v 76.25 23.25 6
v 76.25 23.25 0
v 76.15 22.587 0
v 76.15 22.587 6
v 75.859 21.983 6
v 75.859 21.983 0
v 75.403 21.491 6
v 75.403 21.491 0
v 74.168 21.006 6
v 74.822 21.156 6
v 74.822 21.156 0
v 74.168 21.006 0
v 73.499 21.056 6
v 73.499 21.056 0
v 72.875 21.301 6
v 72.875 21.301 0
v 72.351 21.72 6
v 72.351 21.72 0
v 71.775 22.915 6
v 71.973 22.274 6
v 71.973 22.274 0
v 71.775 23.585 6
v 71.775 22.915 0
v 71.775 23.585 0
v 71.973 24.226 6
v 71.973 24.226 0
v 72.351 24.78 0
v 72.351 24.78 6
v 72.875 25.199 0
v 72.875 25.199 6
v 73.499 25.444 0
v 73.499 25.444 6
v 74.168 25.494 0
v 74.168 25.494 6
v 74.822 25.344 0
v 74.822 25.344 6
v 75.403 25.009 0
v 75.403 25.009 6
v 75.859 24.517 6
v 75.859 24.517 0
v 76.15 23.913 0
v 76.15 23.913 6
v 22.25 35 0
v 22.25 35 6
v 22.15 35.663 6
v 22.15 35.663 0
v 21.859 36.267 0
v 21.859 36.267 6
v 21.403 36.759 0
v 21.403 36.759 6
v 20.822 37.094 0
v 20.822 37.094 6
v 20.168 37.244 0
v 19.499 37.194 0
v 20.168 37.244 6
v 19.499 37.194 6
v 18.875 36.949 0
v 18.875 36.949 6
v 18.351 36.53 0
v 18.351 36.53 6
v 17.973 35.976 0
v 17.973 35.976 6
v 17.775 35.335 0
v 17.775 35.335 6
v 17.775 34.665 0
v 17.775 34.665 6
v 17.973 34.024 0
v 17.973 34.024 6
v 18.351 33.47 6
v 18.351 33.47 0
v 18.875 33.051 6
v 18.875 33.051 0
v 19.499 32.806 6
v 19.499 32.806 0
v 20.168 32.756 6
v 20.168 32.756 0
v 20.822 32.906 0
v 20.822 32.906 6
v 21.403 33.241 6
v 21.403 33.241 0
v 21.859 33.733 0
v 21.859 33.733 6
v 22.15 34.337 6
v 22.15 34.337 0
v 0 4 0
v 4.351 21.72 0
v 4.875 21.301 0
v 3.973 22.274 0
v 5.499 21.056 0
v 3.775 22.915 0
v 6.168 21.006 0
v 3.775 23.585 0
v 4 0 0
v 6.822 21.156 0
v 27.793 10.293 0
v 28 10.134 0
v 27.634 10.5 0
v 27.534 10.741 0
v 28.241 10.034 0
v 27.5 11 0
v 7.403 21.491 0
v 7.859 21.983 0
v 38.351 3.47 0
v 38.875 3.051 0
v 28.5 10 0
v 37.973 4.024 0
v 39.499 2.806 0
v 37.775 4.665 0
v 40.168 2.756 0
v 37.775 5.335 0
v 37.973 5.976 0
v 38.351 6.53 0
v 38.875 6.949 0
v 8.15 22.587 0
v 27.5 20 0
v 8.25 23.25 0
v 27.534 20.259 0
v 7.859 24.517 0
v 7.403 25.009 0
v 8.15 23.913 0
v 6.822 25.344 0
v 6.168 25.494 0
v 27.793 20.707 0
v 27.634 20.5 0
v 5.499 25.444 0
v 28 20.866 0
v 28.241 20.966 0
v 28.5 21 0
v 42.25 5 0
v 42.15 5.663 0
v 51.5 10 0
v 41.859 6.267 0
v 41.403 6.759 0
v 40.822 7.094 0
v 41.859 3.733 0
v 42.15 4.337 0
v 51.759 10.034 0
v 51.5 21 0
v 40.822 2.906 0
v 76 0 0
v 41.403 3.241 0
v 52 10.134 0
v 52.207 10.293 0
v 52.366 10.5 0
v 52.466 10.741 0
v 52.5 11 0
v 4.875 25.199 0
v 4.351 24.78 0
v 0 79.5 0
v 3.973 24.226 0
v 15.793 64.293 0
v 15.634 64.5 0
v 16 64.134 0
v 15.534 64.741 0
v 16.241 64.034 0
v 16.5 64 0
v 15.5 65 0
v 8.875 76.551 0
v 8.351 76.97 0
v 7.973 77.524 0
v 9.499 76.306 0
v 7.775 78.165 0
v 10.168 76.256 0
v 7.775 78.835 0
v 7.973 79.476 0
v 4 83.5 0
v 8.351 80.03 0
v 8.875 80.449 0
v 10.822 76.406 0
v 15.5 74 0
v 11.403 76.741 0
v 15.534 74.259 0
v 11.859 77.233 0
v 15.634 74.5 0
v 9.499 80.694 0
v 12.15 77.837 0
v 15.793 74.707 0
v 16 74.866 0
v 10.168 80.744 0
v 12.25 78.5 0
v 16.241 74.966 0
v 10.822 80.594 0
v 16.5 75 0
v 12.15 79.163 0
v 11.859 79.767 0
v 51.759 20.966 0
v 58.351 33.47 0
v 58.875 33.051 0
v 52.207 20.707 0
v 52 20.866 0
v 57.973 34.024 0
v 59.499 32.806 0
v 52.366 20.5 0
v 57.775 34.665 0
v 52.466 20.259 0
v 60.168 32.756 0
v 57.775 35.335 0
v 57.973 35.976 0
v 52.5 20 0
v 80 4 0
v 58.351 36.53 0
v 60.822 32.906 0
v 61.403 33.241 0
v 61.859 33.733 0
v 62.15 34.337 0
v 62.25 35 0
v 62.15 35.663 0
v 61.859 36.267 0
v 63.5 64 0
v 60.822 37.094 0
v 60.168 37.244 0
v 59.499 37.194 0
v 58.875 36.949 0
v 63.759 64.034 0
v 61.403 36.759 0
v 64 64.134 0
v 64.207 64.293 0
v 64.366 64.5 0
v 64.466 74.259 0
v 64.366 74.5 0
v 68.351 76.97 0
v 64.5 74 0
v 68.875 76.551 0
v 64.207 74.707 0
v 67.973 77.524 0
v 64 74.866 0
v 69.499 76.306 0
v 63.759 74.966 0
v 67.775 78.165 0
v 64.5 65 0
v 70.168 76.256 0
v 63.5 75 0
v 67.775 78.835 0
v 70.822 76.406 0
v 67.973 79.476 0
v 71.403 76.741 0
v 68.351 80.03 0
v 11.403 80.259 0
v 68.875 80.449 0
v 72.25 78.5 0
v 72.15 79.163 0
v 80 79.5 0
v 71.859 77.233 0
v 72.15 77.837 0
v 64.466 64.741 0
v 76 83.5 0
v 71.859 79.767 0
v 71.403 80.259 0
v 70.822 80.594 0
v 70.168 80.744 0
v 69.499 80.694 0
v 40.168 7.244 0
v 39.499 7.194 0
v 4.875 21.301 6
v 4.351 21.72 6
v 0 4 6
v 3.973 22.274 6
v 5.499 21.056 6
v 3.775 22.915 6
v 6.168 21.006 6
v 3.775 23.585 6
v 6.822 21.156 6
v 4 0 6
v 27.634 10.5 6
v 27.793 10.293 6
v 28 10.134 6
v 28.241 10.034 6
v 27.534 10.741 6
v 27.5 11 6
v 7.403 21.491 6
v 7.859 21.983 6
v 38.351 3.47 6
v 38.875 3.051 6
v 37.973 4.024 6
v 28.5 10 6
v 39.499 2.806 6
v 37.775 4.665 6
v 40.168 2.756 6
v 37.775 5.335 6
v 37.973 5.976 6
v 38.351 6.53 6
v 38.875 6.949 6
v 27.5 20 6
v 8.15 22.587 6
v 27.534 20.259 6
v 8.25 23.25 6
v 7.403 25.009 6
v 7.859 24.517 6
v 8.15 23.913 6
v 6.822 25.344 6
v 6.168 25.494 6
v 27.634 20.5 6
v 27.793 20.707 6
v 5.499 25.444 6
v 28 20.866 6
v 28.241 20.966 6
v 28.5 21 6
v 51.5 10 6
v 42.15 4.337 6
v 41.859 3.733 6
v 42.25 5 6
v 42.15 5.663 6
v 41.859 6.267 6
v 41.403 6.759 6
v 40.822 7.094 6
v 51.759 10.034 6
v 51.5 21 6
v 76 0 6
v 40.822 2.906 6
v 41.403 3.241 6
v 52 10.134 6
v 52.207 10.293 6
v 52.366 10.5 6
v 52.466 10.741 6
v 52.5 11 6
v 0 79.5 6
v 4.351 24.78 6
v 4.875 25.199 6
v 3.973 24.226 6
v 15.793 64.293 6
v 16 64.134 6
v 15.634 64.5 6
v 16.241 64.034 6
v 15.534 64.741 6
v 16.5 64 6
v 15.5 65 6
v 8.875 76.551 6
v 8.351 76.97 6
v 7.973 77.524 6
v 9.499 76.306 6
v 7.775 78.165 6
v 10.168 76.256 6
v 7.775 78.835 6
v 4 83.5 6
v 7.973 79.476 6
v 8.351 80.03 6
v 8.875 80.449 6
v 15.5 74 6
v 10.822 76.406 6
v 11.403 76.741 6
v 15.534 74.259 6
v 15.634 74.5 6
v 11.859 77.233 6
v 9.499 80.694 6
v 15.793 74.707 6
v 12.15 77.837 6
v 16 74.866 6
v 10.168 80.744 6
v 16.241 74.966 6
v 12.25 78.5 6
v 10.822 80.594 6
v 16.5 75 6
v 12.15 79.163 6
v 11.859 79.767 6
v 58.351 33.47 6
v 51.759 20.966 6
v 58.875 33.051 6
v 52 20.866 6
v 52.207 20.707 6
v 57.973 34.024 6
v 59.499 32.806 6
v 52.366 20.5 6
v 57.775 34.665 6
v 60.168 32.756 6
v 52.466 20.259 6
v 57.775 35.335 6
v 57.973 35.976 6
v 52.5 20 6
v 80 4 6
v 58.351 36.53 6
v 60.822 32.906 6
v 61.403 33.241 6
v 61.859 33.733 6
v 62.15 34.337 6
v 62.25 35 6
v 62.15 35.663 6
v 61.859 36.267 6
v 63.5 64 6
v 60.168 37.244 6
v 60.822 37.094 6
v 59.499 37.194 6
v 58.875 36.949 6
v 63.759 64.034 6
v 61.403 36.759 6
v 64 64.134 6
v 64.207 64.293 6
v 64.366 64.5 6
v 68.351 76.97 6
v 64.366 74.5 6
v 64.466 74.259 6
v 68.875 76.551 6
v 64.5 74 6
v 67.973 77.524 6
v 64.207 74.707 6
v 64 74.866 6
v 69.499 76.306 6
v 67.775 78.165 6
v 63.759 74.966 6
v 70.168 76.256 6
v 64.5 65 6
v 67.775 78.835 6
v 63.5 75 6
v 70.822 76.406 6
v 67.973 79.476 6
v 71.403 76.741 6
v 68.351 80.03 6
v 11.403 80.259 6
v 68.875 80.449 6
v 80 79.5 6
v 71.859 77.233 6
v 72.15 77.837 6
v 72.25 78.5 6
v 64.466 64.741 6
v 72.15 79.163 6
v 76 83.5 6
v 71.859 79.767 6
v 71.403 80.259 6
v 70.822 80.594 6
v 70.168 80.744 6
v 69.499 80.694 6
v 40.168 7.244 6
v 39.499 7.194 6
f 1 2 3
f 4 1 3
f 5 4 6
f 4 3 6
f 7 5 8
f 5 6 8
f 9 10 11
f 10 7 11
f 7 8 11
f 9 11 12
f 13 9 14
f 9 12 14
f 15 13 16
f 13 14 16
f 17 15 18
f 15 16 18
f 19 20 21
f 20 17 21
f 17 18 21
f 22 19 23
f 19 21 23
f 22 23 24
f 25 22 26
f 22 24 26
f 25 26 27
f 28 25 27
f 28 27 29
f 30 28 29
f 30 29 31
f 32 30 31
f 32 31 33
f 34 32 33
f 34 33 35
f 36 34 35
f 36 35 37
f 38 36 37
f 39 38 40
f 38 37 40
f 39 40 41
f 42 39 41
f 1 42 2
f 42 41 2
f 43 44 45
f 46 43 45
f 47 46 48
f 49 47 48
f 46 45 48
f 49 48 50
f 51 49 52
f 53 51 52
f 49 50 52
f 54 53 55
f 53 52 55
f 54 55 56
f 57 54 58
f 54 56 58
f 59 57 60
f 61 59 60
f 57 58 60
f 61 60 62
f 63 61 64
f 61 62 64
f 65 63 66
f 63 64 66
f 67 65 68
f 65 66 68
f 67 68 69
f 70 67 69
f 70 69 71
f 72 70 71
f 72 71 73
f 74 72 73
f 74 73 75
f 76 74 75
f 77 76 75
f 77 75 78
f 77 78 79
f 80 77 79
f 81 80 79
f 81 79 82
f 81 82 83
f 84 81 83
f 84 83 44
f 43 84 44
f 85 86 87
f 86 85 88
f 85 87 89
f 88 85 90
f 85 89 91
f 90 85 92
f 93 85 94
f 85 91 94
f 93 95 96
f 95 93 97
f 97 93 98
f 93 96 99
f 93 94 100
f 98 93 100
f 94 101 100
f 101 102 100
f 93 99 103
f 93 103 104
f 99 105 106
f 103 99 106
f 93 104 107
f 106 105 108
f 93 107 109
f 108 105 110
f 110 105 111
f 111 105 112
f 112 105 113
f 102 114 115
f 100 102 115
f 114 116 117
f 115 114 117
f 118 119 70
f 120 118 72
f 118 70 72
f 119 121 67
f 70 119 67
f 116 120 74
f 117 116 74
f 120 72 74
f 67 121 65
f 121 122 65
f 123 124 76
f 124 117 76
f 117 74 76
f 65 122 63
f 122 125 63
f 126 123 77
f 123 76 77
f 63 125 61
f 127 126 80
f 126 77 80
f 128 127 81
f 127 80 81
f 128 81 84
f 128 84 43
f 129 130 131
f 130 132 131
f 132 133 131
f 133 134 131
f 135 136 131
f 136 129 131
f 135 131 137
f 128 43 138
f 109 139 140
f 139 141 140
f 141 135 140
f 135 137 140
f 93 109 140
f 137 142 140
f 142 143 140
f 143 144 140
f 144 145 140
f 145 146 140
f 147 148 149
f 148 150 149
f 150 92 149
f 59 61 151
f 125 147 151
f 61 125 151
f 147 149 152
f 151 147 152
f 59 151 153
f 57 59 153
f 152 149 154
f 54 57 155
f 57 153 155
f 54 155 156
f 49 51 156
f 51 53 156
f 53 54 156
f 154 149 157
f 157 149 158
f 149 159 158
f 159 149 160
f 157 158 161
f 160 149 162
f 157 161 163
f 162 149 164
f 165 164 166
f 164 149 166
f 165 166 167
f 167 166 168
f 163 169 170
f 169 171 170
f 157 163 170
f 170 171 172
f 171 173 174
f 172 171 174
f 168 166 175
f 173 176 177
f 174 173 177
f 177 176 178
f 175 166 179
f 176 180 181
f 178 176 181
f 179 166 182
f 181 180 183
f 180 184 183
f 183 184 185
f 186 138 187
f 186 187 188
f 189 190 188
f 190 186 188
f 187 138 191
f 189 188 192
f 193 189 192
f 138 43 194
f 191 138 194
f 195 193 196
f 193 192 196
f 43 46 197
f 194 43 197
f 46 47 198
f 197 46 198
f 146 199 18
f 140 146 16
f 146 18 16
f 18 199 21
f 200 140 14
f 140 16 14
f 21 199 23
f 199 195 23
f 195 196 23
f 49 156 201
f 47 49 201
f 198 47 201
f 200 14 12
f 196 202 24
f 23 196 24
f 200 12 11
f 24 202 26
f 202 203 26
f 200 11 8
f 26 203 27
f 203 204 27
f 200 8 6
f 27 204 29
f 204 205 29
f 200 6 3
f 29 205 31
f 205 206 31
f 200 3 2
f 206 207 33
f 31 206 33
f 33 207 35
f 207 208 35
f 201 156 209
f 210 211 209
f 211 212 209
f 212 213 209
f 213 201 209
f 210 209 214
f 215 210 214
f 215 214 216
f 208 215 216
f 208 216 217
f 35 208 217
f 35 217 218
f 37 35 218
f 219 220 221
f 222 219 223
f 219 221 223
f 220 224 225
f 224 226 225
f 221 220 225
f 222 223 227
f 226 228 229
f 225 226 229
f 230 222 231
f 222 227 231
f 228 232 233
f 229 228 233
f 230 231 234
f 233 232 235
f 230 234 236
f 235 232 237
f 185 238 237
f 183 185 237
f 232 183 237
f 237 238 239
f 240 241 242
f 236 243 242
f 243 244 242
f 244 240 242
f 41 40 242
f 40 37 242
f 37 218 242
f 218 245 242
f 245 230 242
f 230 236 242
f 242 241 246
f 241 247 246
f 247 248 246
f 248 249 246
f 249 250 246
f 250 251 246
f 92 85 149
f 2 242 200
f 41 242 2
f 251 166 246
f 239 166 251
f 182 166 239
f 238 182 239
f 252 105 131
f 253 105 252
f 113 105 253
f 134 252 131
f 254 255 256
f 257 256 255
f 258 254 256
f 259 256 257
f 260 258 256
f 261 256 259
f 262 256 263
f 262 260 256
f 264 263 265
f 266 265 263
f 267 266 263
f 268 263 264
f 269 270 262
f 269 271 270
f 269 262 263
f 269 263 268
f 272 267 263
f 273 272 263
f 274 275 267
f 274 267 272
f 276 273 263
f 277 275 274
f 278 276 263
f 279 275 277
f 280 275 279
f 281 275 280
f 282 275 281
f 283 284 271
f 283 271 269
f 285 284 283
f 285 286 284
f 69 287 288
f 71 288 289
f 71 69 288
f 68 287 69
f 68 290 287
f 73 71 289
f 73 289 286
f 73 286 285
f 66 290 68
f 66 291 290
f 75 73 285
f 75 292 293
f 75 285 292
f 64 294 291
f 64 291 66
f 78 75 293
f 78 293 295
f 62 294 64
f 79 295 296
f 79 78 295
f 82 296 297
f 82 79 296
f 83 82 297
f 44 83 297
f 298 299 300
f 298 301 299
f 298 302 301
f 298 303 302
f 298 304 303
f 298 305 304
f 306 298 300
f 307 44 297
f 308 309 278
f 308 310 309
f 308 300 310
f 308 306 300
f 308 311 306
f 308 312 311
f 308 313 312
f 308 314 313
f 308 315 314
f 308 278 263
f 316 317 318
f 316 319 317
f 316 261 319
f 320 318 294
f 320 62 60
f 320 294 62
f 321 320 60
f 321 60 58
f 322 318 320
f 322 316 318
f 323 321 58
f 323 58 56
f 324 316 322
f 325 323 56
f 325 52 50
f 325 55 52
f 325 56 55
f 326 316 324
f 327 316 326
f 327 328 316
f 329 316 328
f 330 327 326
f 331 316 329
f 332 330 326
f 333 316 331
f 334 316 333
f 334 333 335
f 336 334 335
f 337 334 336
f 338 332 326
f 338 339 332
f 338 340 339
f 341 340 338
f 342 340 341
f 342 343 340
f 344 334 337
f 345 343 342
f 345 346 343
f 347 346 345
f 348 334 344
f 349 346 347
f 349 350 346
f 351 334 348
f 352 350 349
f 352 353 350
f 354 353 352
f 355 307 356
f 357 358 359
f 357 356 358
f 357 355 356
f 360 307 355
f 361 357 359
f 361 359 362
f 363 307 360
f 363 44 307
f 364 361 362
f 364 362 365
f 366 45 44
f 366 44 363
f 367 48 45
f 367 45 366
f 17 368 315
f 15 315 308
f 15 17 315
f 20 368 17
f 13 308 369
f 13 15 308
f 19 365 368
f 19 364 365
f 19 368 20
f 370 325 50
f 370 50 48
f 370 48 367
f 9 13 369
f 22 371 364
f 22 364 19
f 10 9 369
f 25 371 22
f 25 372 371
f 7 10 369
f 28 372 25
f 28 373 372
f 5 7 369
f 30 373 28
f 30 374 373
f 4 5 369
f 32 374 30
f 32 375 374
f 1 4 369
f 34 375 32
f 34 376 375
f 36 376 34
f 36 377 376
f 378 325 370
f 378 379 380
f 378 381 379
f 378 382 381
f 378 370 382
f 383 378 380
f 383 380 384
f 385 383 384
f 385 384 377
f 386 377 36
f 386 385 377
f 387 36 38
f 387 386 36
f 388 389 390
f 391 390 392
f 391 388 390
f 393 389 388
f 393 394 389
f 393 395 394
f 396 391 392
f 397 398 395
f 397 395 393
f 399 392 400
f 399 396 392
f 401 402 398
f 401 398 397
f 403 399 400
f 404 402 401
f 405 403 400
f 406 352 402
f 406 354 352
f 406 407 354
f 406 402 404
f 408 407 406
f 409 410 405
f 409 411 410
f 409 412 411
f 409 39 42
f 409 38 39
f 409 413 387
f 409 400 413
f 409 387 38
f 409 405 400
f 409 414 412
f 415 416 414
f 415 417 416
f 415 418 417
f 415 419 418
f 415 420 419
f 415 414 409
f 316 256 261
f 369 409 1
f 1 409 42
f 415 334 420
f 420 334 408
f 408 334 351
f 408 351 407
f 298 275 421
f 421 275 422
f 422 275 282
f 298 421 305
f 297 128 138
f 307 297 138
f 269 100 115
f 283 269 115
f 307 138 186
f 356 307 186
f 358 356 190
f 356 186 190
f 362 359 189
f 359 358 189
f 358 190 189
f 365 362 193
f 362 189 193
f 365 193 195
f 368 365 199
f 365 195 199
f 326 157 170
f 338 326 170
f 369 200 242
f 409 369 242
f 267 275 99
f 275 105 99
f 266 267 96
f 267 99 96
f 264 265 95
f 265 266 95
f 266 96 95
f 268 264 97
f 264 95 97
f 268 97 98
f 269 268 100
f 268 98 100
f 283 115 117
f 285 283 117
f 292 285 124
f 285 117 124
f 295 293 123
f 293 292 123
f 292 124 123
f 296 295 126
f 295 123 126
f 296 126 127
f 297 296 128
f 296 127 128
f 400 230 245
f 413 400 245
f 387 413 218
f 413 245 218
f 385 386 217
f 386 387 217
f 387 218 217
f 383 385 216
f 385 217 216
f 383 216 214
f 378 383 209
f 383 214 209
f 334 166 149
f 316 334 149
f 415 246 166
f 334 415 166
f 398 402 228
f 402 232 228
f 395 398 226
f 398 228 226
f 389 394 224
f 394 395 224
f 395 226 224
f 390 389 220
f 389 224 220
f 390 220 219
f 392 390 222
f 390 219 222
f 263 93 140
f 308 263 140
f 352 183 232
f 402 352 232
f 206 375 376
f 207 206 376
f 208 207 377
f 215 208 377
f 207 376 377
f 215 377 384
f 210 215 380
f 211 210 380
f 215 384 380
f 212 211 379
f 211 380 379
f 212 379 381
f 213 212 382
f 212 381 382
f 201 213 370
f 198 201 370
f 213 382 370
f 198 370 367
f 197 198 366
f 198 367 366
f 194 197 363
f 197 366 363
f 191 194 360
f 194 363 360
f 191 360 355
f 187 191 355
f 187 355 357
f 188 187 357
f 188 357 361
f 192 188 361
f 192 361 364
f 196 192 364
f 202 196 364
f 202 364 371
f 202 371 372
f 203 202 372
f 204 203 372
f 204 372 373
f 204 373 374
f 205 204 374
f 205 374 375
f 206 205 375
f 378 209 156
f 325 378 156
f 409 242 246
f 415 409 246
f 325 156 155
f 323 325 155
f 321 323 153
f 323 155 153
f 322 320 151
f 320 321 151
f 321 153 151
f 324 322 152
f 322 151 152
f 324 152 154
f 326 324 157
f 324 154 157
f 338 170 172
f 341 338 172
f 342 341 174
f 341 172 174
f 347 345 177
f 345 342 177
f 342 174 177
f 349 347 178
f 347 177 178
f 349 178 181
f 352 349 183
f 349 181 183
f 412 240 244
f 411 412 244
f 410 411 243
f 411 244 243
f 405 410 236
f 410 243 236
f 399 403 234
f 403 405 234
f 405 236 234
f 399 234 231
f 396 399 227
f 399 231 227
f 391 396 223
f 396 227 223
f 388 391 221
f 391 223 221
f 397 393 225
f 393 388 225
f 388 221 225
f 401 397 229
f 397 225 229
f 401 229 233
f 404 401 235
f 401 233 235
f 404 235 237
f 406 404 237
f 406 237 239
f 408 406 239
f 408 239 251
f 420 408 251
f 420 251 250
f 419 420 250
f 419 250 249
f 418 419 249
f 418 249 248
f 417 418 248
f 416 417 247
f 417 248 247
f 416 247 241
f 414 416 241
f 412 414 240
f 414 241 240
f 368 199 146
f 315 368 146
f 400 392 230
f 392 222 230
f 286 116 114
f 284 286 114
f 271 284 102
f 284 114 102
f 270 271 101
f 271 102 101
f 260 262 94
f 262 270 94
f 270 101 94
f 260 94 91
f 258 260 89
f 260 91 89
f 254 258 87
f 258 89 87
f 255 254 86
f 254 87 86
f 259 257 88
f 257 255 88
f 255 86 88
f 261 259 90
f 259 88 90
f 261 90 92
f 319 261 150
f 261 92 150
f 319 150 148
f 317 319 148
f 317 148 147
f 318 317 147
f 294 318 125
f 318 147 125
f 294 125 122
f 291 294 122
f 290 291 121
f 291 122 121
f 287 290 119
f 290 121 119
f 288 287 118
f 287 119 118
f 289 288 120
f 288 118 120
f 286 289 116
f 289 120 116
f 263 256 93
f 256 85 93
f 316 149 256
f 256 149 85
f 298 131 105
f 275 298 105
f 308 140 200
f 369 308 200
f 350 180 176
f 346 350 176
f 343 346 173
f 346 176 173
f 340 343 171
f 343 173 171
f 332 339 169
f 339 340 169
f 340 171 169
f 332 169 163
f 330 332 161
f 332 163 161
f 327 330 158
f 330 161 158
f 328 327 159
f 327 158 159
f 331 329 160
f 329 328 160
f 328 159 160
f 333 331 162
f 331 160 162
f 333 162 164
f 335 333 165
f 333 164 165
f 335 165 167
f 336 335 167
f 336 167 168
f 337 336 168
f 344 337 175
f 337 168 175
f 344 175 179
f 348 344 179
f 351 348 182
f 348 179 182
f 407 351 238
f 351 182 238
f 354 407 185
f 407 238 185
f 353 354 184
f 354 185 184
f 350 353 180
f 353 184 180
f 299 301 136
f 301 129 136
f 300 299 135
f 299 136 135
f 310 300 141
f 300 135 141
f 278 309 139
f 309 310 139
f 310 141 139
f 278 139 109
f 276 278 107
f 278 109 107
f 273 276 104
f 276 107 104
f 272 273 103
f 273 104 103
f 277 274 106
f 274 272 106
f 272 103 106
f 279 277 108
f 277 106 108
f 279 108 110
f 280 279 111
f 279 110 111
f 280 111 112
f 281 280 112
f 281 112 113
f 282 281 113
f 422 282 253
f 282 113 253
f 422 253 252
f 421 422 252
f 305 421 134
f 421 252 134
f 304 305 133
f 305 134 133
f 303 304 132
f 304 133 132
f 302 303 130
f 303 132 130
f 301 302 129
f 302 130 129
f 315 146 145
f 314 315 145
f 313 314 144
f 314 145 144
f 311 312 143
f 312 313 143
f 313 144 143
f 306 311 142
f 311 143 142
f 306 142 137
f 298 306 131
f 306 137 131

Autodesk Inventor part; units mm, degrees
ref_plane "YZ Plane" through (0, 0, 0) normal (1, 0, 0) x (0, 1, 0)
ref_plane "XZ Plane" through (0, 0, 0) normal (0, 1, 0) x (-1, 0, 0)
ref_plane "XY Plane" through (0, 0, 0) normal (0, 0, 1) x (1, 0, 0)
sketch "Sketch1" plane through (0, 0, 0) normal (0, 0, 1) x (1, 0, 0)
  line L0 (4, 0) -> (76, 0)
  line L1 (80, 4) -> (80, 79.5)
  line L2 (76, 83.5) -> (4, 83.5)
  line L3 (0, 79.5) -> (0, 4)
  line L4 (0, 4) -> (4, 0)
  line L5 (76, 0) -> (80, 4)
  line L6 (80, 79.5) -> (76, 83.5)
  line L7 (4, 83.5) -> (0, 79.5)
  line L8 (16.5, 75) -> (63.5, 75)
  line L9 (64.5, 74) -> (64.5, 65)
  line L10 (63.5, 64) -> (16.5, 64)
  line L11 (15.5, 65) -> (15.5, 74)
  arc A0 (15.5, 65) -> (16.5, 64) centre (16.5, 65) ccw
  arc A1 (16.5, 75) -> (15.5, 74) centre (16.5, 74) ccw
  arc A2 (64.5, 74) -> (63.5, 75) centre (63.5, 74) ccw
  arc A3 (63.5, 64) -> (64.5, 65) centre (63.5, 65) ccw
  line L12 (28.5, 21) -> (51.5, 21)
  line L13 (52.5, 20) -> (52.5, 11)
  line L14 (51.5, 10) -> (28.5, 10)
  line L15 (27.5, 11) -> (27.5, 20)
  arc A4 (27.5, 11) -> (28.5, 10) centre (28.5, 11) ccw
  arc A5 (28.5, 21) -> (27.5, 20) centre (28.5, 20) ccw
  arc A6 (52.5, 20) -> (51.5, 21) centre (51.5, 20) ccw
  arc A7 (51.5, 10) -> (52.5, 11) centre (51.5, 11) ccw
  line L16 (15.5, 69.5) -> (64.5, 69.5) construction
  line L17 (27.5, 15.5) -> (52.5, 15.5) construction
  circle A8 centre (40, 5) radius 2.25
  circle A9 centre (10, 78.5) radius 2.25
  circle A10 centre (6, 23.25) radius 2.25
  circle A11 centre (74, 23.25) radius 2.25
  circle A12 centre (70, 78.5) radius 2.25
  point P0 (0, 0)
  point P1 (40, 64)
  point P2 (40, 21)
  point P3 (40, 75)
  point P4 (40, 83.5)
  point P5 (0, 41.75)
  point P6 (80, 41.75)
  dimension "d0" = 45
  dimension "d1" = 4
  dimension "d2" = 1
  dimension "d3" = 11
  dimension "d4" = 49
  dimension "d5" = 1
  dimension "d6" = 11
  dimension "d7" = 25
  dimension "d9" = 10
  dimension "d10" = 8.5
  dimension "d11" = 4.5
  dimension "d12" = 4.5
  dimension "d13" = 5
  dimension "d14" = 5
  dimension "d15" = 4.5
  dimension "d16" = 4.5
  dimension "d19" = 54
  dimension "d22" = 80
  dimension "d23" = 6
  dimension "d24" = 6
  dimension "d25" = 23.25
  dimension "d26" = 4.5
  dimension "d27" = 10
  dimension "d28" = 10
extrude "Extrusion2" add sketch "Sketch1" along normal blind 6
sketch "Sketch2" plane through (0, 0, 6) normal (0, 0, 1) x (1, 0, 0)
  line L0 (4, 0) -> (76, 0) projected
  circle A0 centre (20, 35) radius 2.25
  circle A1 centre (60, 35) radius 2.25
  line L1 (20, 35) -> (60, 35) construction
  point P0 (0, 0)
  point P1 (40, 35)
  point P2 (40, 0)
  dimension "d31" = 4.5
  dimension "d32" = 4.5
  dimension "d33" = 40
  dimension "d34" = 35
extrude "Extrusion3" cut sketch "Sketch2" against normal through all
properties part number "x_carriage"
